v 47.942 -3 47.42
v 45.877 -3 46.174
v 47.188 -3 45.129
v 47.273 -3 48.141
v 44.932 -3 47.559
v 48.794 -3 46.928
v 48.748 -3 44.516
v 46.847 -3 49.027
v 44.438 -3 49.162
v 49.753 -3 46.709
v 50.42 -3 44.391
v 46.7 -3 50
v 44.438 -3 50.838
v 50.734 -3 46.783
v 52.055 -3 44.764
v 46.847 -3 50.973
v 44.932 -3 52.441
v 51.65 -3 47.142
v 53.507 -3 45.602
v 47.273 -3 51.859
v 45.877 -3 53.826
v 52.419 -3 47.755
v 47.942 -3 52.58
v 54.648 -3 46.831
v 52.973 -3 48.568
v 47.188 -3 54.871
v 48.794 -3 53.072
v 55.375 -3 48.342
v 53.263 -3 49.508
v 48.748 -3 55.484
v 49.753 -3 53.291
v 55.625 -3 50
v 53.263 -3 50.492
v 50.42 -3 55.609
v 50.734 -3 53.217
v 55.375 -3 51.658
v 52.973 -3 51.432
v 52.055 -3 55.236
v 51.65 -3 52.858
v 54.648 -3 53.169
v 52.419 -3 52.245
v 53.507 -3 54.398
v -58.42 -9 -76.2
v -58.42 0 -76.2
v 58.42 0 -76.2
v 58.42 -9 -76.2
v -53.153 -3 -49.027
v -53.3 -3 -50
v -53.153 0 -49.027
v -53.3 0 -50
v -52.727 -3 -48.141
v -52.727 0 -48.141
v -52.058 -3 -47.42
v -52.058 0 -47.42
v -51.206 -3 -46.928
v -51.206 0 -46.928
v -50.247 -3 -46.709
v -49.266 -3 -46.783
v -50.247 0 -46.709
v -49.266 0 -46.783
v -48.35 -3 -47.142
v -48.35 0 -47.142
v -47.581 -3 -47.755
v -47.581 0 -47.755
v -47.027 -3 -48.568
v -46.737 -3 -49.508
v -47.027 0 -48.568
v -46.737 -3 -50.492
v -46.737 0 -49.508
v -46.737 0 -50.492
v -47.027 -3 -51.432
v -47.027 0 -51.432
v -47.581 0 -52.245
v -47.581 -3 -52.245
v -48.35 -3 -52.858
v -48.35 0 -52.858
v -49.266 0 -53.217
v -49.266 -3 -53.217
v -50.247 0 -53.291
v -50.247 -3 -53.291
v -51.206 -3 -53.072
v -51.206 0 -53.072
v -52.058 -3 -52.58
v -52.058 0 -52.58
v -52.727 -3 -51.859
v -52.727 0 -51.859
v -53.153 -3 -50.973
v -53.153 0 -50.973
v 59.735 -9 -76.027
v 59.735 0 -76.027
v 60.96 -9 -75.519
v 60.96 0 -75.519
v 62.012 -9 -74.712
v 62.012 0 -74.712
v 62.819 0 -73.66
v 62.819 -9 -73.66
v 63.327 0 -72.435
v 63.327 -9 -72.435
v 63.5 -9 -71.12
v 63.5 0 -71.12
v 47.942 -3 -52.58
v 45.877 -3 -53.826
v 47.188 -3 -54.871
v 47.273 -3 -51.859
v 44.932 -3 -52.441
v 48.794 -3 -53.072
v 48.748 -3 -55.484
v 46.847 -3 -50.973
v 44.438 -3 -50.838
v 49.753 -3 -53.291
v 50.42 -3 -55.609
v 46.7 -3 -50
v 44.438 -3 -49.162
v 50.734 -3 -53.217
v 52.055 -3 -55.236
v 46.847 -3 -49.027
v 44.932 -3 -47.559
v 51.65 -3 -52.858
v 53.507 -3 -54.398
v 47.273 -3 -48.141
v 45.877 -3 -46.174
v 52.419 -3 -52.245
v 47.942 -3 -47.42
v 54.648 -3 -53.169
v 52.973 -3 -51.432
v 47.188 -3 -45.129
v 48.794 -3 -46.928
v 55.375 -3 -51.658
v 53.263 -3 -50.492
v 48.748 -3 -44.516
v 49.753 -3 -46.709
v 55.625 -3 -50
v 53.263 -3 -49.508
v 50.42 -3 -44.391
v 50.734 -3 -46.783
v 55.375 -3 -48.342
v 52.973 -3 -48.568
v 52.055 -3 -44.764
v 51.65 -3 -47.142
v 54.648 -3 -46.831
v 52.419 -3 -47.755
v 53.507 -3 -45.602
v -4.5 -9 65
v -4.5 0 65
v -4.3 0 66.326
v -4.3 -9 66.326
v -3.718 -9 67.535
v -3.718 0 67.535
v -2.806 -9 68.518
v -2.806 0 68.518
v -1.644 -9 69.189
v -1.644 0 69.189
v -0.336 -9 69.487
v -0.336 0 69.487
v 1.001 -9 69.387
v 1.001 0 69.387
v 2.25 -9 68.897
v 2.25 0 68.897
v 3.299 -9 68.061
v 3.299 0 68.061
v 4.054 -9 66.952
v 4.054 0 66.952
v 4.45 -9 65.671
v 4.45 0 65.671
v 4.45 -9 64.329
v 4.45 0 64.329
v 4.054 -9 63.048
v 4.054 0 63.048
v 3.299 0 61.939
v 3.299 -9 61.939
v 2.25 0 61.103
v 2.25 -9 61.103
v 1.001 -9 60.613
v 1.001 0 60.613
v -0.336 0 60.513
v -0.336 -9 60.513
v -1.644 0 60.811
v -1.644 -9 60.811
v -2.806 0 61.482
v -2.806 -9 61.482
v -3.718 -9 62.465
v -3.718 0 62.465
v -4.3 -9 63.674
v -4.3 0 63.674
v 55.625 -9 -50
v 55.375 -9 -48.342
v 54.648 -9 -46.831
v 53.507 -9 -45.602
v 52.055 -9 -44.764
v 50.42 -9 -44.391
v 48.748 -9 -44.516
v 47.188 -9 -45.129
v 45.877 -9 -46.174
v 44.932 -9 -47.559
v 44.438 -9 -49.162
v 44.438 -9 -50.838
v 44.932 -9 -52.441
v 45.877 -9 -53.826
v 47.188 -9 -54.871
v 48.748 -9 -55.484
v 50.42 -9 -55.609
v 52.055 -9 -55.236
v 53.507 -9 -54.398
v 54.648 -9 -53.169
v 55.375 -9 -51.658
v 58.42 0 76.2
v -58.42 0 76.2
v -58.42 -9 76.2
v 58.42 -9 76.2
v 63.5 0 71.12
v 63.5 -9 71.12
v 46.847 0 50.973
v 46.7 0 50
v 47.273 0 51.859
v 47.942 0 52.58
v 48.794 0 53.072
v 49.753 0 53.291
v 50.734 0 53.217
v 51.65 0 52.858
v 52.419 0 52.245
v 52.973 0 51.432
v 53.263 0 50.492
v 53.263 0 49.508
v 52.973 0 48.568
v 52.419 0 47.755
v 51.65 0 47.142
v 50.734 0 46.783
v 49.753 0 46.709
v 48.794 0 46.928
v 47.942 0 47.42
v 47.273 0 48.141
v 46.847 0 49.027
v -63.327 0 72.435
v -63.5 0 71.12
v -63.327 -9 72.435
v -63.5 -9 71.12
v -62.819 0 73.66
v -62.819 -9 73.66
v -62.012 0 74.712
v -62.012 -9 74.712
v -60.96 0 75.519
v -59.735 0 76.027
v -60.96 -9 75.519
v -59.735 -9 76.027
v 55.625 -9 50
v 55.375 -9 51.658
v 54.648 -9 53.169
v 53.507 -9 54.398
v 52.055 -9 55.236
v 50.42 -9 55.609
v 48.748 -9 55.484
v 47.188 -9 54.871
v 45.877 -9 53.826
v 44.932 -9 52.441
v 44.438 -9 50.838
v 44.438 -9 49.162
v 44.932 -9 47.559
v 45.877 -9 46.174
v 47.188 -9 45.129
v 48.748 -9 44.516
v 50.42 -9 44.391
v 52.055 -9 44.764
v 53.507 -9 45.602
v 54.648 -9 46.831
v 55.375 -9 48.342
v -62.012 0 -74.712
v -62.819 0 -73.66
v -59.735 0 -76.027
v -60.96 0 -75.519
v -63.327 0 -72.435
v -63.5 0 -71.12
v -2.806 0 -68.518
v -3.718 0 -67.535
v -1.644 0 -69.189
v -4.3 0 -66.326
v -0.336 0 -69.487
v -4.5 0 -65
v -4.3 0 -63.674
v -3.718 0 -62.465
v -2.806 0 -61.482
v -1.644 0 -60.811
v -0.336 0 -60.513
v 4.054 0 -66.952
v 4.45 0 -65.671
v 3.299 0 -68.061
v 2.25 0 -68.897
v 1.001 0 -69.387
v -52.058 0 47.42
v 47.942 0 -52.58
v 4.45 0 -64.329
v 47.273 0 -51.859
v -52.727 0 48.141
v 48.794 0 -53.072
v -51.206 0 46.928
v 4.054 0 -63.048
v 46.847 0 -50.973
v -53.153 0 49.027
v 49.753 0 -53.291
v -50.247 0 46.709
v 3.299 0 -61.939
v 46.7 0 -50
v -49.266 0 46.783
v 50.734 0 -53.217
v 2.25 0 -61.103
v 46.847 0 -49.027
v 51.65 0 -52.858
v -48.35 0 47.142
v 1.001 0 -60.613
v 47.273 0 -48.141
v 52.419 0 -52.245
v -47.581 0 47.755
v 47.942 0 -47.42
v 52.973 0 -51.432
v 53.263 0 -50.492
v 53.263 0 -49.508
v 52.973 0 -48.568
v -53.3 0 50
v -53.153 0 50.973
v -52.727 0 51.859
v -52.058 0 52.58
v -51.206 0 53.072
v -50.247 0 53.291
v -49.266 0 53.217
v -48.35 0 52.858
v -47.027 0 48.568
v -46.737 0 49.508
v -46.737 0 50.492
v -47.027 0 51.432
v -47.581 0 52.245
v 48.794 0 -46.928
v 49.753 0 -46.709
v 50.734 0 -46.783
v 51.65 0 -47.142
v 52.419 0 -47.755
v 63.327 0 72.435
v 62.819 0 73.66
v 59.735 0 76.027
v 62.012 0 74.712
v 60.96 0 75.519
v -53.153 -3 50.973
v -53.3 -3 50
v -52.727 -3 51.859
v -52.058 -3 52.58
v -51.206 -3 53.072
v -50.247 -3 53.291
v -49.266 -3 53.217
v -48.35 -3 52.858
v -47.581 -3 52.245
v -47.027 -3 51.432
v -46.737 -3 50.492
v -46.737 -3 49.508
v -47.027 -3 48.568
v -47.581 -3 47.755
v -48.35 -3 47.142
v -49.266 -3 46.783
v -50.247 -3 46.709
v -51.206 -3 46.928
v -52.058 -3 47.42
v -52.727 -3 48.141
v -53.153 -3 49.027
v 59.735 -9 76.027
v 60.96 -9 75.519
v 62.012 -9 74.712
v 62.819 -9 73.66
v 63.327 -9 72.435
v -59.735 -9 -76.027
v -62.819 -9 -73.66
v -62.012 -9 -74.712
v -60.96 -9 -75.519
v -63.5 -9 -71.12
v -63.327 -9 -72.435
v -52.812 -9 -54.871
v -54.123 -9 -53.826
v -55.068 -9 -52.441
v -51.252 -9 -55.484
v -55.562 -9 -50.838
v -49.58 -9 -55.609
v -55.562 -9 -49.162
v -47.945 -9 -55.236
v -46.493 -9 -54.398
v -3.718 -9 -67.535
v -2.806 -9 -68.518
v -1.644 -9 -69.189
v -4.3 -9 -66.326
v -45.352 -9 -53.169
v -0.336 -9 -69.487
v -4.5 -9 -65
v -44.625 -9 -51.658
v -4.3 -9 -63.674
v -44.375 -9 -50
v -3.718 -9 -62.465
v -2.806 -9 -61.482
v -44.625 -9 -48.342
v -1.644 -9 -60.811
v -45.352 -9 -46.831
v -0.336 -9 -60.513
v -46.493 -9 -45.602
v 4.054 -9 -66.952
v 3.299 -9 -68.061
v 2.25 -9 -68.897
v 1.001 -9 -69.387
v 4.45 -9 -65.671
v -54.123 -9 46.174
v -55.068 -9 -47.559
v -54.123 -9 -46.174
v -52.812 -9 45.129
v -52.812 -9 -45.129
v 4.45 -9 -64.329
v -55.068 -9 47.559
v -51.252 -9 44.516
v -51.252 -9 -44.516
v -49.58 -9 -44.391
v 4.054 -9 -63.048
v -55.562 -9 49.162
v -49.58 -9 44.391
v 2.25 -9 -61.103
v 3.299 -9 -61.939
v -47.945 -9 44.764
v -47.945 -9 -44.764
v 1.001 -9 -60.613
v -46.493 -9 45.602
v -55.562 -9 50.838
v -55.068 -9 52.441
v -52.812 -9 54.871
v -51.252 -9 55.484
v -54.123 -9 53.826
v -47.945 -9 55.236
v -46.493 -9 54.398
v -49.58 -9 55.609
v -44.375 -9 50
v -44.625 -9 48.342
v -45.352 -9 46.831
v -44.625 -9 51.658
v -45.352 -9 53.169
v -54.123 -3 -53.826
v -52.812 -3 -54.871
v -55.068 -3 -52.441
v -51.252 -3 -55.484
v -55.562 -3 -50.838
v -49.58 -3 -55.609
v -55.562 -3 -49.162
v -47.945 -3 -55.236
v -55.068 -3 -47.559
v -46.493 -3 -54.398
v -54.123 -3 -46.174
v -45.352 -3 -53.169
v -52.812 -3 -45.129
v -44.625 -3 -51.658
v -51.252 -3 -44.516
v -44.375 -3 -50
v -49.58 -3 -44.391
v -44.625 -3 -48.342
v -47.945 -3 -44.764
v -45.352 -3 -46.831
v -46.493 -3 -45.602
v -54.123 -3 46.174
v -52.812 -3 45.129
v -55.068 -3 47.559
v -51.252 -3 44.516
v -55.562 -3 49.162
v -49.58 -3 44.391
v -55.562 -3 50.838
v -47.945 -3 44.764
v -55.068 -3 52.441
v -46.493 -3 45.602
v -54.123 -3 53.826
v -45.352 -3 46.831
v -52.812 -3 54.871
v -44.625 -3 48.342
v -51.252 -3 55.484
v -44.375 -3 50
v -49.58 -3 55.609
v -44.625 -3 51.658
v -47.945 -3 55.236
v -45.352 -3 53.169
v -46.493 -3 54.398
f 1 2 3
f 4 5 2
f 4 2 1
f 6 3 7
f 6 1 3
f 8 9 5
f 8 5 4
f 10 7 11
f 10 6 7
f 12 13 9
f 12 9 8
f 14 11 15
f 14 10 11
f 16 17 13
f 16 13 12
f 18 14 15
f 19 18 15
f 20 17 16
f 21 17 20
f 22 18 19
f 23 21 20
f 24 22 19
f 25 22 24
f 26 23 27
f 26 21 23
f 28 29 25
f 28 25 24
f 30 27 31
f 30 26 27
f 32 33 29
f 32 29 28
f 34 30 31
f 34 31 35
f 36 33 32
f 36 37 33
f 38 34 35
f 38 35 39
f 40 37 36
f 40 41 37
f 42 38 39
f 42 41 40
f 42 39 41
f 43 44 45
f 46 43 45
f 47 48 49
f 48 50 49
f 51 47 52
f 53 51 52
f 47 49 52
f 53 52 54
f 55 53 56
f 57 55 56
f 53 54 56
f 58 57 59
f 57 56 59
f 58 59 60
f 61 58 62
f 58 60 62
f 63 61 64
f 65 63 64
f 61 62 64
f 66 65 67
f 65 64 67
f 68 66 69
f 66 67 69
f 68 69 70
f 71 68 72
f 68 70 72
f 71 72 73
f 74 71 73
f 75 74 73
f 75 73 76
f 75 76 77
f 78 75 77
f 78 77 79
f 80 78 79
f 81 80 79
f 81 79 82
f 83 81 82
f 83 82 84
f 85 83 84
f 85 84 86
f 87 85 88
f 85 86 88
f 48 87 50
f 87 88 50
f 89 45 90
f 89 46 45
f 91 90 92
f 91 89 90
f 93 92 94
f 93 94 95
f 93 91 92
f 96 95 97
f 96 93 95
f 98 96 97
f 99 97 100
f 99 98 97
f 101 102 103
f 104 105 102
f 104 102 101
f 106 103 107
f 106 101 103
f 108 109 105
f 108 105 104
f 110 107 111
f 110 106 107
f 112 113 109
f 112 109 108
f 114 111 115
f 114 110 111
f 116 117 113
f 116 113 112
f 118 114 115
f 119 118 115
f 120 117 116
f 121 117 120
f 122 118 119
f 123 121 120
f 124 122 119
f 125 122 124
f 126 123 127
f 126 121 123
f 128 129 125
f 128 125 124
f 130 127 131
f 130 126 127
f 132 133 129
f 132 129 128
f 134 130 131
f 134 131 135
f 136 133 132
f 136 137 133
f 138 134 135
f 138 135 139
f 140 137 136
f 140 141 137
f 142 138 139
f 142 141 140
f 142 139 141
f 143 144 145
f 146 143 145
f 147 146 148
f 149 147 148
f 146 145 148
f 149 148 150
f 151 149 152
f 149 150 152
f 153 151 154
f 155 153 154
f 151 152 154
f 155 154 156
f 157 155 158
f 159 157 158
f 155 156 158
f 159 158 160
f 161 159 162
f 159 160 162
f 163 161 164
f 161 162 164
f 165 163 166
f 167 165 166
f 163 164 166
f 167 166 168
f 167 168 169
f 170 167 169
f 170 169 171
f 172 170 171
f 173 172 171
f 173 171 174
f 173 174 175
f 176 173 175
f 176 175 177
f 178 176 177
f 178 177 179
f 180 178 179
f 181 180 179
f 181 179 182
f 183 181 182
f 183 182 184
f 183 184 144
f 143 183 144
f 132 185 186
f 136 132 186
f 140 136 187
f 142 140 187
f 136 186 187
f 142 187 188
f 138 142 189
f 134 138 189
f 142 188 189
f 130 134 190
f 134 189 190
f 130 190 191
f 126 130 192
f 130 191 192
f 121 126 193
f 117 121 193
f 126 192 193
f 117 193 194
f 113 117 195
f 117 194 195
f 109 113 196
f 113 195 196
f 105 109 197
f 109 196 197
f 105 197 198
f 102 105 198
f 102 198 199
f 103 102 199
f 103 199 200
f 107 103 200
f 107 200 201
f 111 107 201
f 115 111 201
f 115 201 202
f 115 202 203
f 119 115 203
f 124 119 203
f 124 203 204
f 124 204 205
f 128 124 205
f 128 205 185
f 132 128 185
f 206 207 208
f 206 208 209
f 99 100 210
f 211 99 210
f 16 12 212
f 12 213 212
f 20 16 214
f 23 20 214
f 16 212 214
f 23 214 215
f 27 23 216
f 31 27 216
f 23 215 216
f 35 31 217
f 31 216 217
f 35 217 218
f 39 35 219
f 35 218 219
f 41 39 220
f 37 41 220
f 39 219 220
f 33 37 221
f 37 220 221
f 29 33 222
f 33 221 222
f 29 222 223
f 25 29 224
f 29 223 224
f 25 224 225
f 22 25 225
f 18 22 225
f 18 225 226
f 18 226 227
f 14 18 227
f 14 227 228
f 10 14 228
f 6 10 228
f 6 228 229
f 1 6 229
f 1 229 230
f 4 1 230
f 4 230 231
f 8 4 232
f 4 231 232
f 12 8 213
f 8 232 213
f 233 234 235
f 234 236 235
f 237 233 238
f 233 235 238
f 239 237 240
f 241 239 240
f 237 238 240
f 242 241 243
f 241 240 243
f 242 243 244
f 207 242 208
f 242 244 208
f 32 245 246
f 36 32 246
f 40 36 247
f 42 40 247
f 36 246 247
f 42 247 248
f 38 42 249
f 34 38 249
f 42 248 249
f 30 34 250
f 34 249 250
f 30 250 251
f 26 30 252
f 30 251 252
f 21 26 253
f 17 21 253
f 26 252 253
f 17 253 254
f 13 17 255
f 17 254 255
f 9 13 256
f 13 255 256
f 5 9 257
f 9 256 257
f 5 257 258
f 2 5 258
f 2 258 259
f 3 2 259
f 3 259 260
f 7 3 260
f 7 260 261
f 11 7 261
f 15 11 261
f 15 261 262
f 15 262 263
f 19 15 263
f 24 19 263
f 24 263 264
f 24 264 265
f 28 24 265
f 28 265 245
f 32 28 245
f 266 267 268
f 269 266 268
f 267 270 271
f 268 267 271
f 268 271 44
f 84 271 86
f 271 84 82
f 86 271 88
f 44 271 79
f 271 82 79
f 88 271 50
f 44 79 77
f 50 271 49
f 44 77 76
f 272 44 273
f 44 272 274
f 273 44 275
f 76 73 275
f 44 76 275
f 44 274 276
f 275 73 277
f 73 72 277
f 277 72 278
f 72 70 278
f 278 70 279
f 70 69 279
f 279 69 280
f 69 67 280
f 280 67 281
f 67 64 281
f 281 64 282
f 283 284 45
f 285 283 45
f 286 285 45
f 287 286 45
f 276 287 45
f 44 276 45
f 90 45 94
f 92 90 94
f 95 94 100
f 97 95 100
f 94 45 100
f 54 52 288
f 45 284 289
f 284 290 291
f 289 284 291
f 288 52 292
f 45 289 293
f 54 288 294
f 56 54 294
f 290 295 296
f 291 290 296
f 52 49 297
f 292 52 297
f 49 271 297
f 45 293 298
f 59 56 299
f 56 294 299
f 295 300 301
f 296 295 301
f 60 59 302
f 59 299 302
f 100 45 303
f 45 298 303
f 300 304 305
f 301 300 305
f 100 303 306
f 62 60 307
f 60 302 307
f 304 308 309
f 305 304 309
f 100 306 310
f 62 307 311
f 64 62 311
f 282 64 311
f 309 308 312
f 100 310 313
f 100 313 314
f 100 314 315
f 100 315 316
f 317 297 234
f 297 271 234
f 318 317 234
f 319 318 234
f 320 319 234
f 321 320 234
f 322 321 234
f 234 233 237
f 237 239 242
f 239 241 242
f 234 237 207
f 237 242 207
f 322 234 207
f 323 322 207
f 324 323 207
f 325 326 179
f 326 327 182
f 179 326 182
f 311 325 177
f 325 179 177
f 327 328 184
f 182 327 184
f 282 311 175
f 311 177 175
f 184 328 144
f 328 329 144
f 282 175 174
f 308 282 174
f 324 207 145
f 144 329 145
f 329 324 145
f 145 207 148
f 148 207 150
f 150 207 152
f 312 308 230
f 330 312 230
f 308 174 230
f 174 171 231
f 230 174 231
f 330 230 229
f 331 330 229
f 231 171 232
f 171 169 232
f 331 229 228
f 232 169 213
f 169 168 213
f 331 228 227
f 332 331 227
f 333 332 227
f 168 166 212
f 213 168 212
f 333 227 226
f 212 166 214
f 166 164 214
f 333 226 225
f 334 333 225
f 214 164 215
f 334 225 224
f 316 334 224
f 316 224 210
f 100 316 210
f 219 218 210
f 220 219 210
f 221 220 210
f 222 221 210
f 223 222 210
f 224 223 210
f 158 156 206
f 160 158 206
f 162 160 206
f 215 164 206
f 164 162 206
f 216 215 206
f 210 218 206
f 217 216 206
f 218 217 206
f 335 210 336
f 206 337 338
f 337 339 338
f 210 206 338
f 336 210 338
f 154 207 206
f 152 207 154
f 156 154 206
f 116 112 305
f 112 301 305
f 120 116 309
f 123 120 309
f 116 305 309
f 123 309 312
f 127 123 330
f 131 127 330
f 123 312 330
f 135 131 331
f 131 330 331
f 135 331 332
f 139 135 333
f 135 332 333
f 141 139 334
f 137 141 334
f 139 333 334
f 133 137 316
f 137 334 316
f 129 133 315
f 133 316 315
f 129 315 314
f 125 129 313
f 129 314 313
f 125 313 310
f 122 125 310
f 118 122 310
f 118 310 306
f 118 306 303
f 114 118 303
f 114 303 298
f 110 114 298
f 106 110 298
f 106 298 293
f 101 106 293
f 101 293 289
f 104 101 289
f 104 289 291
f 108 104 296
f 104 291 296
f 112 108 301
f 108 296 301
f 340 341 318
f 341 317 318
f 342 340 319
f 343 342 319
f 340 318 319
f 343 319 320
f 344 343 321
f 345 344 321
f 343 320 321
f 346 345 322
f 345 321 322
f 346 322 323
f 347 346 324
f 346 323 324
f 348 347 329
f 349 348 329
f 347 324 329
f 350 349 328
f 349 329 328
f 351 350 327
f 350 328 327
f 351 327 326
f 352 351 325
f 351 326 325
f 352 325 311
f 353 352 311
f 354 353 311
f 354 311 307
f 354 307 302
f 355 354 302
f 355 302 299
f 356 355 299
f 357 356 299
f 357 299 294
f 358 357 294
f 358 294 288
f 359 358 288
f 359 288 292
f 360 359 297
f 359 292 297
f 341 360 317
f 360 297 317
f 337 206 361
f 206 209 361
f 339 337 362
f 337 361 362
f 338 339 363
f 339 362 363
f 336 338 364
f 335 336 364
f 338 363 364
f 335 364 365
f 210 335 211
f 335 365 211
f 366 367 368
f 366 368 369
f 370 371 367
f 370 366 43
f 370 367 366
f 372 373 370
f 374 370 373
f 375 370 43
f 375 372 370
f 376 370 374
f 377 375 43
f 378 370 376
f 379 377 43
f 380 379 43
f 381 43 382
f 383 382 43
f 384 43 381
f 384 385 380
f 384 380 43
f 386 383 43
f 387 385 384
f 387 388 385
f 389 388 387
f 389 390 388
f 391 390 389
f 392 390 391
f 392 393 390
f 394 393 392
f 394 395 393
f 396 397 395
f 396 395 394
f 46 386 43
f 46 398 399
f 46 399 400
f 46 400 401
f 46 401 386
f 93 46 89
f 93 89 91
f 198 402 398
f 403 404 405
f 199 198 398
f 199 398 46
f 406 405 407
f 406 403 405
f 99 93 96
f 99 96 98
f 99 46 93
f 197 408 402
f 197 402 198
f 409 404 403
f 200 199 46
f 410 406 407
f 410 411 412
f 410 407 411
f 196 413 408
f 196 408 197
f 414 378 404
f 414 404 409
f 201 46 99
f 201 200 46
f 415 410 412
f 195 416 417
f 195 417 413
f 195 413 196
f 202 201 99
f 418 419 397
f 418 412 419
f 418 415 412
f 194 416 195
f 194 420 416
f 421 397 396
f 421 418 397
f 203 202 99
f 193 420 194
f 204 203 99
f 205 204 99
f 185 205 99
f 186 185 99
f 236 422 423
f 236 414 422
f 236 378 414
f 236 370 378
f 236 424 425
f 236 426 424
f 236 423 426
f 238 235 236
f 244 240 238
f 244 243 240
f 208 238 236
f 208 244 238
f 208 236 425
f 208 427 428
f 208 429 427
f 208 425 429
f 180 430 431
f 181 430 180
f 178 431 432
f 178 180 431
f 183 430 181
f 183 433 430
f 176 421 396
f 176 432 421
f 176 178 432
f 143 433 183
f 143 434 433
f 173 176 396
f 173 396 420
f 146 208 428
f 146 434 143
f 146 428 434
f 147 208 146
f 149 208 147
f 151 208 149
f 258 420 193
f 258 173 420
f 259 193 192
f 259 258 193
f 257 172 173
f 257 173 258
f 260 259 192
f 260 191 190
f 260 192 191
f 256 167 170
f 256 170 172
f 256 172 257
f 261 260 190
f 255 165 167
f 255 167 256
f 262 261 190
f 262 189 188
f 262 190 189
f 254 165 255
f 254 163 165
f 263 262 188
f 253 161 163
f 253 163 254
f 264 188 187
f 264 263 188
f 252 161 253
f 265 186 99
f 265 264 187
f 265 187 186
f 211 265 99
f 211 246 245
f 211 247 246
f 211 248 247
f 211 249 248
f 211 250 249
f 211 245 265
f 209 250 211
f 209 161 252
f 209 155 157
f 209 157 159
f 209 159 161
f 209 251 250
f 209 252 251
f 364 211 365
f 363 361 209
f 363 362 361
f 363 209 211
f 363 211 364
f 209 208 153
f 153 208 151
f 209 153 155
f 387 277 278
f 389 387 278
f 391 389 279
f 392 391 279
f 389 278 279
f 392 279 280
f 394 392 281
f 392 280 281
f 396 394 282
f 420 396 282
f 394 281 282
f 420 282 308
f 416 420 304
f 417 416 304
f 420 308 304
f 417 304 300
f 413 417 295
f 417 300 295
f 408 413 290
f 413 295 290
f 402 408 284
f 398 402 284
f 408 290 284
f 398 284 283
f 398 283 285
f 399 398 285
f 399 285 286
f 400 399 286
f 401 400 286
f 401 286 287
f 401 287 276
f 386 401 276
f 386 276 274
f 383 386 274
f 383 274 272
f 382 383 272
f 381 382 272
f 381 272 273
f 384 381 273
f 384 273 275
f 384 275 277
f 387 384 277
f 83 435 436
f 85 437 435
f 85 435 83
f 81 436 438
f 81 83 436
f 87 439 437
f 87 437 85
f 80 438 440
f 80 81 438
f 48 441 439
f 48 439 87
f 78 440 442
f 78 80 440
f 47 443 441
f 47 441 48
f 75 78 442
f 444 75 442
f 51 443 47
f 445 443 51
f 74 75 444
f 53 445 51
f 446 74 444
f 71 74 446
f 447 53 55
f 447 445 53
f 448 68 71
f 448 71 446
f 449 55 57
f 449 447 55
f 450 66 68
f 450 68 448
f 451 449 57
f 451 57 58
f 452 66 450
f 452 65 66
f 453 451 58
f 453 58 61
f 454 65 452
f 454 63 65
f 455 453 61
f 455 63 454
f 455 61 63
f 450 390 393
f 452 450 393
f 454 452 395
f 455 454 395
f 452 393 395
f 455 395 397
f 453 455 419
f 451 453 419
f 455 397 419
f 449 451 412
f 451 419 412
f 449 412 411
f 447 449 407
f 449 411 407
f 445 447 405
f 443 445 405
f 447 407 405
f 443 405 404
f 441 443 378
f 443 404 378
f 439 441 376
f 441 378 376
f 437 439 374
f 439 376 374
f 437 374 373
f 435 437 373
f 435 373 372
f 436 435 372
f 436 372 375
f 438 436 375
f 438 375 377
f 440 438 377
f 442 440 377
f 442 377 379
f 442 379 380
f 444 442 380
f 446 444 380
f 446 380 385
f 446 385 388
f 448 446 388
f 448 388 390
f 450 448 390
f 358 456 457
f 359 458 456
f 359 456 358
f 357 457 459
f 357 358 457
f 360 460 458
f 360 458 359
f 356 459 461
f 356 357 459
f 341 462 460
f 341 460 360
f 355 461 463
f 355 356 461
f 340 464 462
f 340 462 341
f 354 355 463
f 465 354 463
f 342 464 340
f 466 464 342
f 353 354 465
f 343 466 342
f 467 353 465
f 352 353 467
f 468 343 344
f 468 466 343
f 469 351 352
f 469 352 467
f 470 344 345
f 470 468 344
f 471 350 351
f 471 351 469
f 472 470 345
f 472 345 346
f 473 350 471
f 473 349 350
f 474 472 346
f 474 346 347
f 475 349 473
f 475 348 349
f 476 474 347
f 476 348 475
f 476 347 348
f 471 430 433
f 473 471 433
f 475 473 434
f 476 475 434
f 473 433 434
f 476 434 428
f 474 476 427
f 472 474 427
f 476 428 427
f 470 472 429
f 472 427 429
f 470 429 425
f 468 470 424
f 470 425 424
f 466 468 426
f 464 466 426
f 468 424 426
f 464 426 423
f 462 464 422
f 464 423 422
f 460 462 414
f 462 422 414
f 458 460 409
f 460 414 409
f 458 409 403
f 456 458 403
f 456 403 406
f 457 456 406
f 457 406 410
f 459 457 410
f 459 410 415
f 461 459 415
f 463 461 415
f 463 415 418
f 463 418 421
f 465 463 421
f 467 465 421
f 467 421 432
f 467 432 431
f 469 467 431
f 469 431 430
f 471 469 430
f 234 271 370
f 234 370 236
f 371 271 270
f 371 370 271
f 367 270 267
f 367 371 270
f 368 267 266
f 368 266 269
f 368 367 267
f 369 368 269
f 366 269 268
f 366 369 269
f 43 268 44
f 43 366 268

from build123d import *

# Parameters (mm, degrees)
F0_W           = 127
F0_H           = 152.4
F1_DEPTH       = 9
F3_D           = 9
F5_D           = 6.6
F5_CBORE_D     = 11.25
F5_CBORE_DEPTH = 6
F6_R           = 5.08


with BuildPart() as f1:
    # F0 (on Front) → F1 (new body)
    with BuildSketch(Plane.XZ):
        Rectangle(F0_W, F0_H)
    extrude(amount=F1_DEPTH)

    # F3 (through all)
    with Locations(Plane.XZ.offset(9)):
        with Locations((0, 65), (0, -65)):
            Hole(F3_D / 2)

    # F5 (through all)
    with Locations(Plane.XZ.offset(9)):
        with Locations((-50, 50), (50, 50), (50, -50), (-50, -50)):
            CounterBoreHole(F5_D / 2, F5_CBORE_D / 2, F5_CBORE_DEPTH)

    # F6
    f6_edges = [f1.edges().sort_by_distance(p)[0] for p in [
        (63.5, -4.5, 76.2),
        (63.5, -4.5, -76.2),
        (-63.5, -4.5, -76.2),
        (-63.5, -4.5, 76.2),
    ]]
    fillet(f6_edges, radius=F6_R)


solid = f1.part
